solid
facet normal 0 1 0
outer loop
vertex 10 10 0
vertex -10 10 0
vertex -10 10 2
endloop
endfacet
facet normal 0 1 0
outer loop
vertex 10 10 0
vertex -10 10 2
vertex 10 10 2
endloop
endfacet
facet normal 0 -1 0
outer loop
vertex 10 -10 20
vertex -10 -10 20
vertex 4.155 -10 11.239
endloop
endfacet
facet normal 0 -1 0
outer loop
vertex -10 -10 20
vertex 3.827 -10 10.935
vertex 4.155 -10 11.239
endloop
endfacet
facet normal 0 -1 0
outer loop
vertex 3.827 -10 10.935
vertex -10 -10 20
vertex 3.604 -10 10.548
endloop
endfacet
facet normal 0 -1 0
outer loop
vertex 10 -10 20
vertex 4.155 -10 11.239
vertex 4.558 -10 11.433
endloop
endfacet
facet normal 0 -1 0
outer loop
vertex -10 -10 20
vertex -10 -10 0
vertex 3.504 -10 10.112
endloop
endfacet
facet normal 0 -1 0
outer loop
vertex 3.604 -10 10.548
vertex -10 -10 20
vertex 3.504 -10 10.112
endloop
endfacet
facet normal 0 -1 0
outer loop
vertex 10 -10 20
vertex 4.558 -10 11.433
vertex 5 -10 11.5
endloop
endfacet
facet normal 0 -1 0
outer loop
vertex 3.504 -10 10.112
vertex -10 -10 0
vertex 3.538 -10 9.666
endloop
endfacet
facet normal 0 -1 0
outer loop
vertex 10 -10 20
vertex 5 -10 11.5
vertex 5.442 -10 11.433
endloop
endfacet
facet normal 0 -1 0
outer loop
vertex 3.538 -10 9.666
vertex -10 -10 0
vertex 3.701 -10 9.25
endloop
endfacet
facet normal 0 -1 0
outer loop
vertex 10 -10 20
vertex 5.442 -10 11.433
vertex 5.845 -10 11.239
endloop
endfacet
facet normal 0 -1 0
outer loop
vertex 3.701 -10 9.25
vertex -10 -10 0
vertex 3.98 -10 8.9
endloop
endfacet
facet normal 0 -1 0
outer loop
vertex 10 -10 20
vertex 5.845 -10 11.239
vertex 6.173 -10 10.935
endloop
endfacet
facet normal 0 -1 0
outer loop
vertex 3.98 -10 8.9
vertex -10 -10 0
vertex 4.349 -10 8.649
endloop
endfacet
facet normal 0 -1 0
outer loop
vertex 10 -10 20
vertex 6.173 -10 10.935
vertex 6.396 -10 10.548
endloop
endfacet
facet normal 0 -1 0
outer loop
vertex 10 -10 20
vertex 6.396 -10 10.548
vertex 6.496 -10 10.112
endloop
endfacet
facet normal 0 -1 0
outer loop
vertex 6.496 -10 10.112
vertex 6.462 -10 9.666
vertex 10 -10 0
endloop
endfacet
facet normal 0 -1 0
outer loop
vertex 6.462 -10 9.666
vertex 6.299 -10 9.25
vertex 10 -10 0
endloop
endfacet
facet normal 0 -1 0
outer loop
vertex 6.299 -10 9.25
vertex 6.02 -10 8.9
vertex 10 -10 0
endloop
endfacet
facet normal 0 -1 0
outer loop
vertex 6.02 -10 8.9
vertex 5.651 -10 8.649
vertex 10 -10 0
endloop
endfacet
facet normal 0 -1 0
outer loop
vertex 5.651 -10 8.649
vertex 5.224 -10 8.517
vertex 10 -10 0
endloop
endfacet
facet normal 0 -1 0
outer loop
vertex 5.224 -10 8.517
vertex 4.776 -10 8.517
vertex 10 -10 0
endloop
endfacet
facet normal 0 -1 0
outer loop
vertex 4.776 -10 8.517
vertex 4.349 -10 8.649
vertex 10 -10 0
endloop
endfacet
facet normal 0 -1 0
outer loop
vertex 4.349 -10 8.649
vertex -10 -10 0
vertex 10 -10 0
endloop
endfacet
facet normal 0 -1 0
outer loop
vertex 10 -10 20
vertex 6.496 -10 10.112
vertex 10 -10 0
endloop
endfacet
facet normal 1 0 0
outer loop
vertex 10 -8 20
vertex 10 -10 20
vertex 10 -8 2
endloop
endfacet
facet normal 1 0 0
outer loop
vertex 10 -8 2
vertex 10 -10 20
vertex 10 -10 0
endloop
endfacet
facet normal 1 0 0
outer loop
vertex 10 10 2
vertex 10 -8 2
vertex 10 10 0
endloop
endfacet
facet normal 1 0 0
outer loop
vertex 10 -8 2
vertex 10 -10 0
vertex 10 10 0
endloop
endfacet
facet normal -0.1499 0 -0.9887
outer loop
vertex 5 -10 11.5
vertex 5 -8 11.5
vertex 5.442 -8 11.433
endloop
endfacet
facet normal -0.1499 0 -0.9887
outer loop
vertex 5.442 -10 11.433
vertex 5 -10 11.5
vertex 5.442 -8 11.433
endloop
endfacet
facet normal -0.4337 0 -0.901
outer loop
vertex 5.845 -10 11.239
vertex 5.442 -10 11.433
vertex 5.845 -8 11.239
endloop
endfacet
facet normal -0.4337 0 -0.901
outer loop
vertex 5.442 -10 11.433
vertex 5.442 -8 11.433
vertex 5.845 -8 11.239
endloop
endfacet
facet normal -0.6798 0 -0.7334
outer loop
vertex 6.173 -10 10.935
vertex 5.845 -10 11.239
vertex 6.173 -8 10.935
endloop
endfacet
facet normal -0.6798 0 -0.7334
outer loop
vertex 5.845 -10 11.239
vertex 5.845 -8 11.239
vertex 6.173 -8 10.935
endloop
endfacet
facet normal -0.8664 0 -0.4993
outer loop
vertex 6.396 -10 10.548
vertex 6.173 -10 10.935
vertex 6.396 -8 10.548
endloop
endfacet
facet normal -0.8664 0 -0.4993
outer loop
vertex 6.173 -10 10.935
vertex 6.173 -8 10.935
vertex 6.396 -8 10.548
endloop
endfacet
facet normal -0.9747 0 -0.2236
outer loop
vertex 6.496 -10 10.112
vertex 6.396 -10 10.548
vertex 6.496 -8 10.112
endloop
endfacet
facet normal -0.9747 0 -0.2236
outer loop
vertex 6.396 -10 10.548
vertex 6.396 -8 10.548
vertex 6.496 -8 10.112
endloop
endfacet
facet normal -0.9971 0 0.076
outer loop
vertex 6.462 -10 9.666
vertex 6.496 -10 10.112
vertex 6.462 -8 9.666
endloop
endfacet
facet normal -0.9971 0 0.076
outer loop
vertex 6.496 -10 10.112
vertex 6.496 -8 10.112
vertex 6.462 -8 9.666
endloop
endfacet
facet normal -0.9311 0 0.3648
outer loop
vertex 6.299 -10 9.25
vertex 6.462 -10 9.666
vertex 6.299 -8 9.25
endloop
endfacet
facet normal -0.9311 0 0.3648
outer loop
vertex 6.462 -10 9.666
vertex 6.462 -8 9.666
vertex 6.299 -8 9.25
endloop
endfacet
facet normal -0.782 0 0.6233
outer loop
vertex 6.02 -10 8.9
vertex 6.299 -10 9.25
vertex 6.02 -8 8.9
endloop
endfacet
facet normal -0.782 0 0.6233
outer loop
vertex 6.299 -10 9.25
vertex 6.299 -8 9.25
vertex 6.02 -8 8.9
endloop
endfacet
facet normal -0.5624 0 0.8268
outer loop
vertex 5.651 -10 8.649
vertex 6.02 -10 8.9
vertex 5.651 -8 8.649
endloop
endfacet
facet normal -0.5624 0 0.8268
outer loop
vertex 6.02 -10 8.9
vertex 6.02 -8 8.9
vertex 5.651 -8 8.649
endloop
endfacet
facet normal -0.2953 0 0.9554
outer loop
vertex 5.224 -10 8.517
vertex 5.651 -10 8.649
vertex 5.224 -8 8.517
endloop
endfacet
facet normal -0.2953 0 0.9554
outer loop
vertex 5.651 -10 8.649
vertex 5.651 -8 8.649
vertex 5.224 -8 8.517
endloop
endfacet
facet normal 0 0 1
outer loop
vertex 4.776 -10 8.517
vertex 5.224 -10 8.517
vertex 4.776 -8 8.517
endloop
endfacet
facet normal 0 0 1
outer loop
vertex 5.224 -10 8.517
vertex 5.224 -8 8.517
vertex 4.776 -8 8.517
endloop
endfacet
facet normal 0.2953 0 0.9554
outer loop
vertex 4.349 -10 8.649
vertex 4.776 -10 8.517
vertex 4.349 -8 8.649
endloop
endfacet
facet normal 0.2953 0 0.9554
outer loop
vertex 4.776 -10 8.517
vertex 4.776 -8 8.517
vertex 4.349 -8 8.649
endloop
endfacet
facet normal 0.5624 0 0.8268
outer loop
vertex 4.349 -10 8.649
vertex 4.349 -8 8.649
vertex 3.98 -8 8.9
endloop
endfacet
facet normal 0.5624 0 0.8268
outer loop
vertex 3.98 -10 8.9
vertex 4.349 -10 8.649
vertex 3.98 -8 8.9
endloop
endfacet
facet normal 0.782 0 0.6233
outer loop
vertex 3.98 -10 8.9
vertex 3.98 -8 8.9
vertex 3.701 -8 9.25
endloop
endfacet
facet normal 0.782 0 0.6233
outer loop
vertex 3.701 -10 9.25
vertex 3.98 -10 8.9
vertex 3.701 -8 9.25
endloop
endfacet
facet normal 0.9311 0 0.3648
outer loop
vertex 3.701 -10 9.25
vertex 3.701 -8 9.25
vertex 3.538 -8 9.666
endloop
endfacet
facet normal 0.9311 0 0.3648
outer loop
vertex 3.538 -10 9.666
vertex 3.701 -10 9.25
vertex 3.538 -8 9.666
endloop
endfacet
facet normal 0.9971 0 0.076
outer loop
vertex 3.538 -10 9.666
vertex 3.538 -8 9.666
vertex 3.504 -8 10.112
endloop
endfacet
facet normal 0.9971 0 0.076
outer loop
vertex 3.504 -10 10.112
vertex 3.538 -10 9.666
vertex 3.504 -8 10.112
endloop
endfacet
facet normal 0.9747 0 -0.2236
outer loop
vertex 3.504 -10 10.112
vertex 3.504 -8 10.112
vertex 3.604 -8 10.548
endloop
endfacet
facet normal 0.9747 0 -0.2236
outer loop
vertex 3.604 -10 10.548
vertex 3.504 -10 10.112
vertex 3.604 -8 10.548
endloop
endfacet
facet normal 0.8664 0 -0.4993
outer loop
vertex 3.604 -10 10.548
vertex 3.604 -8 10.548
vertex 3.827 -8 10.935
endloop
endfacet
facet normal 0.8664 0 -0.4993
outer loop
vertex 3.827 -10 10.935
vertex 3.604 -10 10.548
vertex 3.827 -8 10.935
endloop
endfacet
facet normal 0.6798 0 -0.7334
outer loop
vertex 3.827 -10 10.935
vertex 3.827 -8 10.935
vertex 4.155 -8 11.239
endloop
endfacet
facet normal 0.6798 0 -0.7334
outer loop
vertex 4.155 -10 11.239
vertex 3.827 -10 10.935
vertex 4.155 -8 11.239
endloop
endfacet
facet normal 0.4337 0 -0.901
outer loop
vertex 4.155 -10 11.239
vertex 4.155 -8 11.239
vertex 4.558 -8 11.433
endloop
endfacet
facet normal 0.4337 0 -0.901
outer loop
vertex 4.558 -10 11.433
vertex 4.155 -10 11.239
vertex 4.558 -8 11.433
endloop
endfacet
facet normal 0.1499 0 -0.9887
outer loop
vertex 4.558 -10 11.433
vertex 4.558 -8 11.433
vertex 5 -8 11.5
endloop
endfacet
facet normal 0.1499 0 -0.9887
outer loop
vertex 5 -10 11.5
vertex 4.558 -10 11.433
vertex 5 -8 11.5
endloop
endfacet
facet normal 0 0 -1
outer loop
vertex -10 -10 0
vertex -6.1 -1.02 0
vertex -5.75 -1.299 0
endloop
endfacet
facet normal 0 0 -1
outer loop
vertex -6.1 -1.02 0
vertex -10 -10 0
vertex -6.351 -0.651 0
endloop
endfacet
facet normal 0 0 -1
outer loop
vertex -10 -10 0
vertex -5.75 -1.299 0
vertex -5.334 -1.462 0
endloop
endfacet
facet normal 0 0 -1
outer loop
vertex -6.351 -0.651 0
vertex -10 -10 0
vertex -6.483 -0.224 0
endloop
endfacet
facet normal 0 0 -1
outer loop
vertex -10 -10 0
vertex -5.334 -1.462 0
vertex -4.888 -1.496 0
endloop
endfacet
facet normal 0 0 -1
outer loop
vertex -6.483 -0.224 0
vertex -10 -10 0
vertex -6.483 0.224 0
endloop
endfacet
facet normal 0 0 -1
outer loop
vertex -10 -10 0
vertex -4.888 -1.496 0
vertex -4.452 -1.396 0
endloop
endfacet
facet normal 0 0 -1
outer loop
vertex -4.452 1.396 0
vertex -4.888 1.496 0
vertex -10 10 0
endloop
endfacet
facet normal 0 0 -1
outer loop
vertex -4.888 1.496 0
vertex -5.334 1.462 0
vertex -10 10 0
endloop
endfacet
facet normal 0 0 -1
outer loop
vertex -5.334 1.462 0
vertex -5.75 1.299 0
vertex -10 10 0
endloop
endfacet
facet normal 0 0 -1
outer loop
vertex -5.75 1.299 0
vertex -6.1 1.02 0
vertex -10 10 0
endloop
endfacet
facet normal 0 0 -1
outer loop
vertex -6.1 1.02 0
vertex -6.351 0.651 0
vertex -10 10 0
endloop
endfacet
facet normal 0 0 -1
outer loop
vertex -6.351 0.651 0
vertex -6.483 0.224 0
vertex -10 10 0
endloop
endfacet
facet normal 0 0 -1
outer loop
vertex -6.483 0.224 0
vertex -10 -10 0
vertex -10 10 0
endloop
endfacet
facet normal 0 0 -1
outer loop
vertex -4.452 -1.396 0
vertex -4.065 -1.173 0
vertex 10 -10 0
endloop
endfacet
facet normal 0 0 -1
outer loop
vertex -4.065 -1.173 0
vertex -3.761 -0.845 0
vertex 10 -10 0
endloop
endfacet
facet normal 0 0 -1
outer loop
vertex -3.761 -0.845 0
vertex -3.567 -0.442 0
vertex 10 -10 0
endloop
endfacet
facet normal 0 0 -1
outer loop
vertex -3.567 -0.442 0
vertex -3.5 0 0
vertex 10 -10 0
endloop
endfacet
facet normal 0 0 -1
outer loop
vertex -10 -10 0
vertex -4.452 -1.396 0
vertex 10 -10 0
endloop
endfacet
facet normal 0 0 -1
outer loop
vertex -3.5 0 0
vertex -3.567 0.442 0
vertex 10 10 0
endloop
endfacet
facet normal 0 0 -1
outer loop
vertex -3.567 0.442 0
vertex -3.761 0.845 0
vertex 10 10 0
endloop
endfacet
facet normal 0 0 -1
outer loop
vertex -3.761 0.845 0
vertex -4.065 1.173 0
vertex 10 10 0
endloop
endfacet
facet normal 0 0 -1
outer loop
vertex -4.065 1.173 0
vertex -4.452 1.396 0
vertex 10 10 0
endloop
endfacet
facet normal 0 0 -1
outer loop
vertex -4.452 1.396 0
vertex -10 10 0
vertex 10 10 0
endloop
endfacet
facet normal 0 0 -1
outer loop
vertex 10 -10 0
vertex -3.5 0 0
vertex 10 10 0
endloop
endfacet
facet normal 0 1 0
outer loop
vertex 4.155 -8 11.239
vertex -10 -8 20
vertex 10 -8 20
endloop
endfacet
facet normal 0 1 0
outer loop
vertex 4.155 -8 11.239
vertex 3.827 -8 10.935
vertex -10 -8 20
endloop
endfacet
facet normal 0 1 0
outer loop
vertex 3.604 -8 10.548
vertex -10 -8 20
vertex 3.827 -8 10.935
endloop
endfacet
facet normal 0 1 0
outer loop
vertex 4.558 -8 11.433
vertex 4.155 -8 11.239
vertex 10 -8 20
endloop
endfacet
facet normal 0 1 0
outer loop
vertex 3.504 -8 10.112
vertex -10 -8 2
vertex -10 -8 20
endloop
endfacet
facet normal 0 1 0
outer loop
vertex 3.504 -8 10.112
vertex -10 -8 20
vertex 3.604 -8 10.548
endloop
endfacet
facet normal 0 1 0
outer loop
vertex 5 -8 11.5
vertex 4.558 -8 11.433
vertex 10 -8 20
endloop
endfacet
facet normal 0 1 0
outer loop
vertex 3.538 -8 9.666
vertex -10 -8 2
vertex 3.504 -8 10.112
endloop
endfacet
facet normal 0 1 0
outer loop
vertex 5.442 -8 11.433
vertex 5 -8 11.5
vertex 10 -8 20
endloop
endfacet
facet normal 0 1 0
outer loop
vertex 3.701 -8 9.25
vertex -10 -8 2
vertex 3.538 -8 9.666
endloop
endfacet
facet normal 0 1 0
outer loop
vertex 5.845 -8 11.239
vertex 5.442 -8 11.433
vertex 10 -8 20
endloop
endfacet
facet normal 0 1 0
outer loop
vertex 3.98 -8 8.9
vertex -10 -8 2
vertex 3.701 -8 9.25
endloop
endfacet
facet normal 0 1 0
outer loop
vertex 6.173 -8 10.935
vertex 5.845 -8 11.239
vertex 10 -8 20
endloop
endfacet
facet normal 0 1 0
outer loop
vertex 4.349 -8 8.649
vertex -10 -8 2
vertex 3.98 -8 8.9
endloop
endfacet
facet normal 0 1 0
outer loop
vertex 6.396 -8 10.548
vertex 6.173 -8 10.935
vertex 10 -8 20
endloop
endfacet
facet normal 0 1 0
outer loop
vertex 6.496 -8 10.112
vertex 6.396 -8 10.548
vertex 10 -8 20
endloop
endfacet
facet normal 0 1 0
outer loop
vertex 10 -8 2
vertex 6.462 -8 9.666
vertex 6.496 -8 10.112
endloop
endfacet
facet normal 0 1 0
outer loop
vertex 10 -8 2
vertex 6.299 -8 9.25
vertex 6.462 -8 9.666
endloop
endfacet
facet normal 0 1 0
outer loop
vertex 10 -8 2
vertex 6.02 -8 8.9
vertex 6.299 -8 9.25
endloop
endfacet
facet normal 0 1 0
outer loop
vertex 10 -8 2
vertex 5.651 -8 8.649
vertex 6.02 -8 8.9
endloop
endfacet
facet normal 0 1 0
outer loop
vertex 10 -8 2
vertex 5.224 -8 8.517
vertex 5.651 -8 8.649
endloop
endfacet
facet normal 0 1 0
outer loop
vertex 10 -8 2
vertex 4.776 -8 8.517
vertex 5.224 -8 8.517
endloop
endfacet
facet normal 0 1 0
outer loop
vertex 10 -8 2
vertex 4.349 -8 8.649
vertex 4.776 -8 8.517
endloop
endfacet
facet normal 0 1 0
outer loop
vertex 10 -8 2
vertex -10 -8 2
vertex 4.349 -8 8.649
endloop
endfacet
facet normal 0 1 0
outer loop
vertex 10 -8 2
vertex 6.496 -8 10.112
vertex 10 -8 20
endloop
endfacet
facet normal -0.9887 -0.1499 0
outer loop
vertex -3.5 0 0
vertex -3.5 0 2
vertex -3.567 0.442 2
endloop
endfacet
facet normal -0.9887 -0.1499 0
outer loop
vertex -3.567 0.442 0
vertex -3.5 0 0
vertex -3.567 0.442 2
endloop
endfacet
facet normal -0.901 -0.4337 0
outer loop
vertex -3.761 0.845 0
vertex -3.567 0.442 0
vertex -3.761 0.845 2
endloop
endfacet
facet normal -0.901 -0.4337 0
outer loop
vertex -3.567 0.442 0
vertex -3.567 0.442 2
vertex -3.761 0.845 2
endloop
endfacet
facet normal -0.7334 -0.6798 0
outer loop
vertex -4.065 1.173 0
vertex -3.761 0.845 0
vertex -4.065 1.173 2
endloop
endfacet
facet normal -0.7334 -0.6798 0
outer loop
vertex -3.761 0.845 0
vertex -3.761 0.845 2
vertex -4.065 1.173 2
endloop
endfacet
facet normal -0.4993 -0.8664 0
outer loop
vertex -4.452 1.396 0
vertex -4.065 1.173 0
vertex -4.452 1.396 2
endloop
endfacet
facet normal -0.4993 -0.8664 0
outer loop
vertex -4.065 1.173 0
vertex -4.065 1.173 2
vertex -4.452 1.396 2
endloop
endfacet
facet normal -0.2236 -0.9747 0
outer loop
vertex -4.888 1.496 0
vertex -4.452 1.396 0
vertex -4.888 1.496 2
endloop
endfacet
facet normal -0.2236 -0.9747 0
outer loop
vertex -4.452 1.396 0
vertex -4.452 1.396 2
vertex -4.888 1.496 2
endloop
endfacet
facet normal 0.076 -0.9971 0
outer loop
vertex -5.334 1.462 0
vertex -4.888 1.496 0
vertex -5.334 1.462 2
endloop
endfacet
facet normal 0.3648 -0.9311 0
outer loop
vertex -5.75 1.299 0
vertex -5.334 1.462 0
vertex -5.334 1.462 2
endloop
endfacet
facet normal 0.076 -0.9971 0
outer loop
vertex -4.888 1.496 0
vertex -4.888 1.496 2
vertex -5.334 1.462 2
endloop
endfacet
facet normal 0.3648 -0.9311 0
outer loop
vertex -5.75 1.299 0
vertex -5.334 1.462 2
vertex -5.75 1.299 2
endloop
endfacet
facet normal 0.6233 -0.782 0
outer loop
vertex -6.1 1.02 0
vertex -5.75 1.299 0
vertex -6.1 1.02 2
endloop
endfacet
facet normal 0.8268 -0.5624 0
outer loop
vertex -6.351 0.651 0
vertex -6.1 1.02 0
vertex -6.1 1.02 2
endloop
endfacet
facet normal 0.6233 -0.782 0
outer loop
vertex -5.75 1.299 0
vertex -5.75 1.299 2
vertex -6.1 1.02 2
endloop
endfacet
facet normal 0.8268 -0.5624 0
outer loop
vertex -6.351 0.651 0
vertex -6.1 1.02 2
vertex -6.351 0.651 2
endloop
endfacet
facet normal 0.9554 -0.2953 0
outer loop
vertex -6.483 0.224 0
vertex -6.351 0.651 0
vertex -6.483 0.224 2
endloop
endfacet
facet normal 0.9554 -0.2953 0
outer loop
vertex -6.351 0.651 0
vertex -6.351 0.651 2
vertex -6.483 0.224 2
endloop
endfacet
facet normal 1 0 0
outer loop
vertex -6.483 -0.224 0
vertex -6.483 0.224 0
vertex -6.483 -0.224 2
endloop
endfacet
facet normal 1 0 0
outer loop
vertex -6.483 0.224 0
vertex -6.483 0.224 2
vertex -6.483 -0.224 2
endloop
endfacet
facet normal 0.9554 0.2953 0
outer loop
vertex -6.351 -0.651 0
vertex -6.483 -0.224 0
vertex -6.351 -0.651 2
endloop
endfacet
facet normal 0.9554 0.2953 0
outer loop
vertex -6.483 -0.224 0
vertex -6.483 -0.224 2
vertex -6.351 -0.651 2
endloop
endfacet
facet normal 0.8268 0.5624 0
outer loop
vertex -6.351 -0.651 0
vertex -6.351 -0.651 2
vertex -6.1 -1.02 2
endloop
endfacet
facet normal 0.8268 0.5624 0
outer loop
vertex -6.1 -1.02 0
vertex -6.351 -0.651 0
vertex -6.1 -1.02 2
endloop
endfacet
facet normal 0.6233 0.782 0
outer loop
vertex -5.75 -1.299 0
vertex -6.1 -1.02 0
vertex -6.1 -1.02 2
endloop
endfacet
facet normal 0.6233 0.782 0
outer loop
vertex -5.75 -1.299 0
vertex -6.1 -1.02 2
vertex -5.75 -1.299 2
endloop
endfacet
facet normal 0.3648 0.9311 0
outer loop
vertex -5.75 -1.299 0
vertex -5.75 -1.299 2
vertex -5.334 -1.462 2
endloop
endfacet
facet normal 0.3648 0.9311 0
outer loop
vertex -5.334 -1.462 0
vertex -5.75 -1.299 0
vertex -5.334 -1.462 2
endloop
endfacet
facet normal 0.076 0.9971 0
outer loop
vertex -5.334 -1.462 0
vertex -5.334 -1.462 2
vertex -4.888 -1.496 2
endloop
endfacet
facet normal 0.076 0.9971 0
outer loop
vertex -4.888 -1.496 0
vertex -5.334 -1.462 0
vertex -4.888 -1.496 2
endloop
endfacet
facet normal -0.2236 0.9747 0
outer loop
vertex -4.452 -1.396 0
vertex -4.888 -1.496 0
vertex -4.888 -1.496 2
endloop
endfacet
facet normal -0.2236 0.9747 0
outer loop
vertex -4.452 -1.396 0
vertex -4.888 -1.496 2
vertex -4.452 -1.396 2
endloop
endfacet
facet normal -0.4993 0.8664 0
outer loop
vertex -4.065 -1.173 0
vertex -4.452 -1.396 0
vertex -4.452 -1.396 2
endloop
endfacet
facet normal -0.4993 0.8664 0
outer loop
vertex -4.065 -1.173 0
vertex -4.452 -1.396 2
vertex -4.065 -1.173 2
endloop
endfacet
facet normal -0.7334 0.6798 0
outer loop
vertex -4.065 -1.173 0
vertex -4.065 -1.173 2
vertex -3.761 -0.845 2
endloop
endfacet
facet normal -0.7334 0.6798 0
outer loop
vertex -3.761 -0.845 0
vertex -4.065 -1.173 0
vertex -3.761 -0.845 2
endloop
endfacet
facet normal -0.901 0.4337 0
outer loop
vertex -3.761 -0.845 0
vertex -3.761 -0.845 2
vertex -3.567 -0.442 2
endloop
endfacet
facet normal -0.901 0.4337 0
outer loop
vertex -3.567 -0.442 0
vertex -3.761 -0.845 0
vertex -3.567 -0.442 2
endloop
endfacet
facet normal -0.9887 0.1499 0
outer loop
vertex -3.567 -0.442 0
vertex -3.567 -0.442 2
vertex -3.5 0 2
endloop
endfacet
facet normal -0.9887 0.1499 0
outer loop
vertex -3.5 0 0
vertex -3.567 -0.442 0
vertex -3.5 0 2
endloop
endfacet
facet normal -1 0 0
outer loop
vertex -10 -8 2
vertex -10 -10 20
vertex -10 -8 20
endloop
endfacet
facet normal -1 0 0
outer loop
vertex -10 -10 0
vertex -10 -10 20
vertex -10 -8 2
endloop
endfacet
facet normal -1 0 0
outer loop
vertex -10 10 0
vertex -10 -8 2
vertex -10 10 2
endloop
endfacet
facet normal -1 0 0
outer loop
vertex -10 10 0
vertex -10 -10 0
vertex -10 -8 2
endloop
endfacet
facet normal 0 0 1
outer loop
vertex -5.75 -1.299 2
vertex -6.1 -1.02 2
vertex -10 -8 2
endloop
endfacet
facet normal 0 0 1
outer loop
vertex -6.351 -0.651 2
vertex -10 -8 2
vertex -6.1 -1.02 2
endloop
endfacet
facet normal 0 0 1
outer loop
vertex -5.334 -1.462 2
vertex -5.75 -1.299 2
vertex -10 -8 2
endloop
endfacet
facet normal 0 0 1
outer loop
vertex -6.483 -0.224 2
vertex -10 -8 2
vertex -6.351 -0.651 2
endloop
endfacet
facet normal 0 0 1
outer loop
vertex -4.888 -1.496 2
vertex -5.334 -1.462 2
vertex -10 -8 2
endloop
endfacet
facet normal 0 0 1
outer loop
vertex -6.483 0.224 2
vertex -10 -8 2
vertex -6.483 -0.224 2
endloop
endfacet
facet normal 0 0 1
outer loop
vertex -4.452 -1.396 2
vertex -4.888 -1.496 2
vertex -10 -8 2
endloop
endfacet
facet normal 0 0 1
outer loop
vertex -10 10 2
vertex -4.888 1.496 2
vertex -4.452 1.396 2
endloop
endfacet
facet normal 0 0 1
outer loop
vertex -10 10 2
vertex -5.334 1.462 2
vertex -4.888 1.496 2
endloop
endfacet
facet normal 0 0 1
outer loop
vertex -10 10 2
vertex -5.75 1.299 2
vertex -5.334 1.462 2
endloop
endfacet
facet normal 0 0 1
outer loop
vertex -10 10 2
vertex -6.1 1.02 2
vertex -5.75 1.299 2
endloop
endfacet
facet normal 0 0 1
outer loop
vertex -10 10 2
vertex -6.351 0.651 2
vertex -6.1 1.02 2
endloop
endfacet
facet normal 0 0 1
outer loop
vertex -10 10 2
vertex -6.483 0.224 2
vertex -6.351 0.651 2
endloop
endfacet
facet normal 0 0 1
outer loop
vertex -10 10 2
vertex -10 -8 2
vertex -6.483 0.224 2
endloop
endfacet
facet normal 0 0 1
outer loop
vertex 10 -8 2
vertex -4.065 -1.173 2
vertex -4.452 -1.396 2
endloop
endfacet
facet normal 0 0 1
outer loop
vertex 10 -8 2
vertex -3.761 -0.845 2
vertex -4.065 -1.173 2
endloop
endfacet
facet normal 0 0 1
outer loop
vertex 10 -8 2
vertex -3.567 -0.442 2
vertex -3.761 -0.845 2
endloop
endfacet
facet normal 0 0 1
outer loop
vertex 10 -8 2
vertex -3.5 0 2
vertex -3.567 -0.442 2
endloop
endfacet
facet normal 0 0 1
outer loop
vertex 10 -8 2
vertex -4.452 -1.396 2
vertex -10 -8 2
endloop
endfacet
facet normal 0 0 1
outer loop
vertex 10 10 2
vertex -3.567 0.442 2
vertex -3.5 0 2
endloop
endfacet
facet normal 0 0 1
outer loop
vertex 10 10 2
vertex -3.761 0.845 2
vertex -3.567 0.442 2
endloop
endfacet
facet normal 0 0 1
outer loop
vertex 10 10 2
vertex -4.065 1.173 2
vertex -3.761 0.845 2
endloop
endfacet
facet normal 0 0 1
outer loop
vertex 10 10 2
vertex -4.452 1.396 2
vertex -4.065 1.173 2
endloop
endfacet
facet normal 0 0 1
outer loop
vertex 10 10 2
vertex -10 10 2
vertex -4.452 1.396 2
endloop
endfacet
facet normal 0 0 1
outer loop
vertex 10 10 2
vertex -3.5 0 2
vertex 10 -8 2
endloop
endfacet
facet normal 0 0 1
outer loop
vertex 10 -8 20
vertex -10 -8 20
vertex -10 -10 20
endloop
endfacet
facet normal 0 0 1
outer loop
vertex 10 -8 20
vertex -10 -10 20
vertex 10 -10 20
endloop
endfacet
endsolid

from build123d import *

# Parameters (mm, degrees)
SKETCH_1_W          = 20
SKETCH_1_H          = 20
EXTRUDE_1_DEPTH     = 2
SKETCH_2_W          = 20
SKETCH_2_H          = 2
EXTRUDE_2_DEPTH     = 18
SKETCH_3_R          = 1.5
CUT_EXTRUDE_1_DEPTH = 10
SKETCH_4_R          = 1.5
CUT_EXTRUDE_2_DEPTH = 10


with BuildPart() as part:
    # 草图1 → 凸台-拉伸1 (new body)
    with BuildSketch(Plane.XY):
        Rectangle(SKETCH_1_W, SKETCH_1_H)
    extrude(amount=EXTRUDE_1_DEPTH)

    # 草图2 → 凸台-拉伸2 (add)
    with BuildSketch(Plane.XY.offset(2)):
        with Locations((0, -9)):
            Rectangle(SKETCH_2_W, SKETCH_2_H)
    extrude(amount=EXTRUDE_2_DEPTH)

    # 草图3 → 切除-拉伸1 (cut)
    with BuildSketch(Plane.XY.offset(2)):
        with Locations((-5, 0)):
            Circle(SKETCH_3_R)
    extrude(amount=-CUT_EXTRUDE_1_DEPTH, mode=Mode.SUBTRACT)

    # 草图4 → 切除-拉伸2 (cut)
    with BuildSketch(Plane(origin=(0, -8, 0), x_dir=(1, 0, 0), z_dir=(0, 1, 0))):
        with Locations(Location((5, -10, 0), (0, 0, 270))):
            Circle(SKETCH_4_R)
    extrude(amount=-CUT_EXTRUDE_2_DEPTH, mode=Mode.SUBTRACT)


solid = part.part
